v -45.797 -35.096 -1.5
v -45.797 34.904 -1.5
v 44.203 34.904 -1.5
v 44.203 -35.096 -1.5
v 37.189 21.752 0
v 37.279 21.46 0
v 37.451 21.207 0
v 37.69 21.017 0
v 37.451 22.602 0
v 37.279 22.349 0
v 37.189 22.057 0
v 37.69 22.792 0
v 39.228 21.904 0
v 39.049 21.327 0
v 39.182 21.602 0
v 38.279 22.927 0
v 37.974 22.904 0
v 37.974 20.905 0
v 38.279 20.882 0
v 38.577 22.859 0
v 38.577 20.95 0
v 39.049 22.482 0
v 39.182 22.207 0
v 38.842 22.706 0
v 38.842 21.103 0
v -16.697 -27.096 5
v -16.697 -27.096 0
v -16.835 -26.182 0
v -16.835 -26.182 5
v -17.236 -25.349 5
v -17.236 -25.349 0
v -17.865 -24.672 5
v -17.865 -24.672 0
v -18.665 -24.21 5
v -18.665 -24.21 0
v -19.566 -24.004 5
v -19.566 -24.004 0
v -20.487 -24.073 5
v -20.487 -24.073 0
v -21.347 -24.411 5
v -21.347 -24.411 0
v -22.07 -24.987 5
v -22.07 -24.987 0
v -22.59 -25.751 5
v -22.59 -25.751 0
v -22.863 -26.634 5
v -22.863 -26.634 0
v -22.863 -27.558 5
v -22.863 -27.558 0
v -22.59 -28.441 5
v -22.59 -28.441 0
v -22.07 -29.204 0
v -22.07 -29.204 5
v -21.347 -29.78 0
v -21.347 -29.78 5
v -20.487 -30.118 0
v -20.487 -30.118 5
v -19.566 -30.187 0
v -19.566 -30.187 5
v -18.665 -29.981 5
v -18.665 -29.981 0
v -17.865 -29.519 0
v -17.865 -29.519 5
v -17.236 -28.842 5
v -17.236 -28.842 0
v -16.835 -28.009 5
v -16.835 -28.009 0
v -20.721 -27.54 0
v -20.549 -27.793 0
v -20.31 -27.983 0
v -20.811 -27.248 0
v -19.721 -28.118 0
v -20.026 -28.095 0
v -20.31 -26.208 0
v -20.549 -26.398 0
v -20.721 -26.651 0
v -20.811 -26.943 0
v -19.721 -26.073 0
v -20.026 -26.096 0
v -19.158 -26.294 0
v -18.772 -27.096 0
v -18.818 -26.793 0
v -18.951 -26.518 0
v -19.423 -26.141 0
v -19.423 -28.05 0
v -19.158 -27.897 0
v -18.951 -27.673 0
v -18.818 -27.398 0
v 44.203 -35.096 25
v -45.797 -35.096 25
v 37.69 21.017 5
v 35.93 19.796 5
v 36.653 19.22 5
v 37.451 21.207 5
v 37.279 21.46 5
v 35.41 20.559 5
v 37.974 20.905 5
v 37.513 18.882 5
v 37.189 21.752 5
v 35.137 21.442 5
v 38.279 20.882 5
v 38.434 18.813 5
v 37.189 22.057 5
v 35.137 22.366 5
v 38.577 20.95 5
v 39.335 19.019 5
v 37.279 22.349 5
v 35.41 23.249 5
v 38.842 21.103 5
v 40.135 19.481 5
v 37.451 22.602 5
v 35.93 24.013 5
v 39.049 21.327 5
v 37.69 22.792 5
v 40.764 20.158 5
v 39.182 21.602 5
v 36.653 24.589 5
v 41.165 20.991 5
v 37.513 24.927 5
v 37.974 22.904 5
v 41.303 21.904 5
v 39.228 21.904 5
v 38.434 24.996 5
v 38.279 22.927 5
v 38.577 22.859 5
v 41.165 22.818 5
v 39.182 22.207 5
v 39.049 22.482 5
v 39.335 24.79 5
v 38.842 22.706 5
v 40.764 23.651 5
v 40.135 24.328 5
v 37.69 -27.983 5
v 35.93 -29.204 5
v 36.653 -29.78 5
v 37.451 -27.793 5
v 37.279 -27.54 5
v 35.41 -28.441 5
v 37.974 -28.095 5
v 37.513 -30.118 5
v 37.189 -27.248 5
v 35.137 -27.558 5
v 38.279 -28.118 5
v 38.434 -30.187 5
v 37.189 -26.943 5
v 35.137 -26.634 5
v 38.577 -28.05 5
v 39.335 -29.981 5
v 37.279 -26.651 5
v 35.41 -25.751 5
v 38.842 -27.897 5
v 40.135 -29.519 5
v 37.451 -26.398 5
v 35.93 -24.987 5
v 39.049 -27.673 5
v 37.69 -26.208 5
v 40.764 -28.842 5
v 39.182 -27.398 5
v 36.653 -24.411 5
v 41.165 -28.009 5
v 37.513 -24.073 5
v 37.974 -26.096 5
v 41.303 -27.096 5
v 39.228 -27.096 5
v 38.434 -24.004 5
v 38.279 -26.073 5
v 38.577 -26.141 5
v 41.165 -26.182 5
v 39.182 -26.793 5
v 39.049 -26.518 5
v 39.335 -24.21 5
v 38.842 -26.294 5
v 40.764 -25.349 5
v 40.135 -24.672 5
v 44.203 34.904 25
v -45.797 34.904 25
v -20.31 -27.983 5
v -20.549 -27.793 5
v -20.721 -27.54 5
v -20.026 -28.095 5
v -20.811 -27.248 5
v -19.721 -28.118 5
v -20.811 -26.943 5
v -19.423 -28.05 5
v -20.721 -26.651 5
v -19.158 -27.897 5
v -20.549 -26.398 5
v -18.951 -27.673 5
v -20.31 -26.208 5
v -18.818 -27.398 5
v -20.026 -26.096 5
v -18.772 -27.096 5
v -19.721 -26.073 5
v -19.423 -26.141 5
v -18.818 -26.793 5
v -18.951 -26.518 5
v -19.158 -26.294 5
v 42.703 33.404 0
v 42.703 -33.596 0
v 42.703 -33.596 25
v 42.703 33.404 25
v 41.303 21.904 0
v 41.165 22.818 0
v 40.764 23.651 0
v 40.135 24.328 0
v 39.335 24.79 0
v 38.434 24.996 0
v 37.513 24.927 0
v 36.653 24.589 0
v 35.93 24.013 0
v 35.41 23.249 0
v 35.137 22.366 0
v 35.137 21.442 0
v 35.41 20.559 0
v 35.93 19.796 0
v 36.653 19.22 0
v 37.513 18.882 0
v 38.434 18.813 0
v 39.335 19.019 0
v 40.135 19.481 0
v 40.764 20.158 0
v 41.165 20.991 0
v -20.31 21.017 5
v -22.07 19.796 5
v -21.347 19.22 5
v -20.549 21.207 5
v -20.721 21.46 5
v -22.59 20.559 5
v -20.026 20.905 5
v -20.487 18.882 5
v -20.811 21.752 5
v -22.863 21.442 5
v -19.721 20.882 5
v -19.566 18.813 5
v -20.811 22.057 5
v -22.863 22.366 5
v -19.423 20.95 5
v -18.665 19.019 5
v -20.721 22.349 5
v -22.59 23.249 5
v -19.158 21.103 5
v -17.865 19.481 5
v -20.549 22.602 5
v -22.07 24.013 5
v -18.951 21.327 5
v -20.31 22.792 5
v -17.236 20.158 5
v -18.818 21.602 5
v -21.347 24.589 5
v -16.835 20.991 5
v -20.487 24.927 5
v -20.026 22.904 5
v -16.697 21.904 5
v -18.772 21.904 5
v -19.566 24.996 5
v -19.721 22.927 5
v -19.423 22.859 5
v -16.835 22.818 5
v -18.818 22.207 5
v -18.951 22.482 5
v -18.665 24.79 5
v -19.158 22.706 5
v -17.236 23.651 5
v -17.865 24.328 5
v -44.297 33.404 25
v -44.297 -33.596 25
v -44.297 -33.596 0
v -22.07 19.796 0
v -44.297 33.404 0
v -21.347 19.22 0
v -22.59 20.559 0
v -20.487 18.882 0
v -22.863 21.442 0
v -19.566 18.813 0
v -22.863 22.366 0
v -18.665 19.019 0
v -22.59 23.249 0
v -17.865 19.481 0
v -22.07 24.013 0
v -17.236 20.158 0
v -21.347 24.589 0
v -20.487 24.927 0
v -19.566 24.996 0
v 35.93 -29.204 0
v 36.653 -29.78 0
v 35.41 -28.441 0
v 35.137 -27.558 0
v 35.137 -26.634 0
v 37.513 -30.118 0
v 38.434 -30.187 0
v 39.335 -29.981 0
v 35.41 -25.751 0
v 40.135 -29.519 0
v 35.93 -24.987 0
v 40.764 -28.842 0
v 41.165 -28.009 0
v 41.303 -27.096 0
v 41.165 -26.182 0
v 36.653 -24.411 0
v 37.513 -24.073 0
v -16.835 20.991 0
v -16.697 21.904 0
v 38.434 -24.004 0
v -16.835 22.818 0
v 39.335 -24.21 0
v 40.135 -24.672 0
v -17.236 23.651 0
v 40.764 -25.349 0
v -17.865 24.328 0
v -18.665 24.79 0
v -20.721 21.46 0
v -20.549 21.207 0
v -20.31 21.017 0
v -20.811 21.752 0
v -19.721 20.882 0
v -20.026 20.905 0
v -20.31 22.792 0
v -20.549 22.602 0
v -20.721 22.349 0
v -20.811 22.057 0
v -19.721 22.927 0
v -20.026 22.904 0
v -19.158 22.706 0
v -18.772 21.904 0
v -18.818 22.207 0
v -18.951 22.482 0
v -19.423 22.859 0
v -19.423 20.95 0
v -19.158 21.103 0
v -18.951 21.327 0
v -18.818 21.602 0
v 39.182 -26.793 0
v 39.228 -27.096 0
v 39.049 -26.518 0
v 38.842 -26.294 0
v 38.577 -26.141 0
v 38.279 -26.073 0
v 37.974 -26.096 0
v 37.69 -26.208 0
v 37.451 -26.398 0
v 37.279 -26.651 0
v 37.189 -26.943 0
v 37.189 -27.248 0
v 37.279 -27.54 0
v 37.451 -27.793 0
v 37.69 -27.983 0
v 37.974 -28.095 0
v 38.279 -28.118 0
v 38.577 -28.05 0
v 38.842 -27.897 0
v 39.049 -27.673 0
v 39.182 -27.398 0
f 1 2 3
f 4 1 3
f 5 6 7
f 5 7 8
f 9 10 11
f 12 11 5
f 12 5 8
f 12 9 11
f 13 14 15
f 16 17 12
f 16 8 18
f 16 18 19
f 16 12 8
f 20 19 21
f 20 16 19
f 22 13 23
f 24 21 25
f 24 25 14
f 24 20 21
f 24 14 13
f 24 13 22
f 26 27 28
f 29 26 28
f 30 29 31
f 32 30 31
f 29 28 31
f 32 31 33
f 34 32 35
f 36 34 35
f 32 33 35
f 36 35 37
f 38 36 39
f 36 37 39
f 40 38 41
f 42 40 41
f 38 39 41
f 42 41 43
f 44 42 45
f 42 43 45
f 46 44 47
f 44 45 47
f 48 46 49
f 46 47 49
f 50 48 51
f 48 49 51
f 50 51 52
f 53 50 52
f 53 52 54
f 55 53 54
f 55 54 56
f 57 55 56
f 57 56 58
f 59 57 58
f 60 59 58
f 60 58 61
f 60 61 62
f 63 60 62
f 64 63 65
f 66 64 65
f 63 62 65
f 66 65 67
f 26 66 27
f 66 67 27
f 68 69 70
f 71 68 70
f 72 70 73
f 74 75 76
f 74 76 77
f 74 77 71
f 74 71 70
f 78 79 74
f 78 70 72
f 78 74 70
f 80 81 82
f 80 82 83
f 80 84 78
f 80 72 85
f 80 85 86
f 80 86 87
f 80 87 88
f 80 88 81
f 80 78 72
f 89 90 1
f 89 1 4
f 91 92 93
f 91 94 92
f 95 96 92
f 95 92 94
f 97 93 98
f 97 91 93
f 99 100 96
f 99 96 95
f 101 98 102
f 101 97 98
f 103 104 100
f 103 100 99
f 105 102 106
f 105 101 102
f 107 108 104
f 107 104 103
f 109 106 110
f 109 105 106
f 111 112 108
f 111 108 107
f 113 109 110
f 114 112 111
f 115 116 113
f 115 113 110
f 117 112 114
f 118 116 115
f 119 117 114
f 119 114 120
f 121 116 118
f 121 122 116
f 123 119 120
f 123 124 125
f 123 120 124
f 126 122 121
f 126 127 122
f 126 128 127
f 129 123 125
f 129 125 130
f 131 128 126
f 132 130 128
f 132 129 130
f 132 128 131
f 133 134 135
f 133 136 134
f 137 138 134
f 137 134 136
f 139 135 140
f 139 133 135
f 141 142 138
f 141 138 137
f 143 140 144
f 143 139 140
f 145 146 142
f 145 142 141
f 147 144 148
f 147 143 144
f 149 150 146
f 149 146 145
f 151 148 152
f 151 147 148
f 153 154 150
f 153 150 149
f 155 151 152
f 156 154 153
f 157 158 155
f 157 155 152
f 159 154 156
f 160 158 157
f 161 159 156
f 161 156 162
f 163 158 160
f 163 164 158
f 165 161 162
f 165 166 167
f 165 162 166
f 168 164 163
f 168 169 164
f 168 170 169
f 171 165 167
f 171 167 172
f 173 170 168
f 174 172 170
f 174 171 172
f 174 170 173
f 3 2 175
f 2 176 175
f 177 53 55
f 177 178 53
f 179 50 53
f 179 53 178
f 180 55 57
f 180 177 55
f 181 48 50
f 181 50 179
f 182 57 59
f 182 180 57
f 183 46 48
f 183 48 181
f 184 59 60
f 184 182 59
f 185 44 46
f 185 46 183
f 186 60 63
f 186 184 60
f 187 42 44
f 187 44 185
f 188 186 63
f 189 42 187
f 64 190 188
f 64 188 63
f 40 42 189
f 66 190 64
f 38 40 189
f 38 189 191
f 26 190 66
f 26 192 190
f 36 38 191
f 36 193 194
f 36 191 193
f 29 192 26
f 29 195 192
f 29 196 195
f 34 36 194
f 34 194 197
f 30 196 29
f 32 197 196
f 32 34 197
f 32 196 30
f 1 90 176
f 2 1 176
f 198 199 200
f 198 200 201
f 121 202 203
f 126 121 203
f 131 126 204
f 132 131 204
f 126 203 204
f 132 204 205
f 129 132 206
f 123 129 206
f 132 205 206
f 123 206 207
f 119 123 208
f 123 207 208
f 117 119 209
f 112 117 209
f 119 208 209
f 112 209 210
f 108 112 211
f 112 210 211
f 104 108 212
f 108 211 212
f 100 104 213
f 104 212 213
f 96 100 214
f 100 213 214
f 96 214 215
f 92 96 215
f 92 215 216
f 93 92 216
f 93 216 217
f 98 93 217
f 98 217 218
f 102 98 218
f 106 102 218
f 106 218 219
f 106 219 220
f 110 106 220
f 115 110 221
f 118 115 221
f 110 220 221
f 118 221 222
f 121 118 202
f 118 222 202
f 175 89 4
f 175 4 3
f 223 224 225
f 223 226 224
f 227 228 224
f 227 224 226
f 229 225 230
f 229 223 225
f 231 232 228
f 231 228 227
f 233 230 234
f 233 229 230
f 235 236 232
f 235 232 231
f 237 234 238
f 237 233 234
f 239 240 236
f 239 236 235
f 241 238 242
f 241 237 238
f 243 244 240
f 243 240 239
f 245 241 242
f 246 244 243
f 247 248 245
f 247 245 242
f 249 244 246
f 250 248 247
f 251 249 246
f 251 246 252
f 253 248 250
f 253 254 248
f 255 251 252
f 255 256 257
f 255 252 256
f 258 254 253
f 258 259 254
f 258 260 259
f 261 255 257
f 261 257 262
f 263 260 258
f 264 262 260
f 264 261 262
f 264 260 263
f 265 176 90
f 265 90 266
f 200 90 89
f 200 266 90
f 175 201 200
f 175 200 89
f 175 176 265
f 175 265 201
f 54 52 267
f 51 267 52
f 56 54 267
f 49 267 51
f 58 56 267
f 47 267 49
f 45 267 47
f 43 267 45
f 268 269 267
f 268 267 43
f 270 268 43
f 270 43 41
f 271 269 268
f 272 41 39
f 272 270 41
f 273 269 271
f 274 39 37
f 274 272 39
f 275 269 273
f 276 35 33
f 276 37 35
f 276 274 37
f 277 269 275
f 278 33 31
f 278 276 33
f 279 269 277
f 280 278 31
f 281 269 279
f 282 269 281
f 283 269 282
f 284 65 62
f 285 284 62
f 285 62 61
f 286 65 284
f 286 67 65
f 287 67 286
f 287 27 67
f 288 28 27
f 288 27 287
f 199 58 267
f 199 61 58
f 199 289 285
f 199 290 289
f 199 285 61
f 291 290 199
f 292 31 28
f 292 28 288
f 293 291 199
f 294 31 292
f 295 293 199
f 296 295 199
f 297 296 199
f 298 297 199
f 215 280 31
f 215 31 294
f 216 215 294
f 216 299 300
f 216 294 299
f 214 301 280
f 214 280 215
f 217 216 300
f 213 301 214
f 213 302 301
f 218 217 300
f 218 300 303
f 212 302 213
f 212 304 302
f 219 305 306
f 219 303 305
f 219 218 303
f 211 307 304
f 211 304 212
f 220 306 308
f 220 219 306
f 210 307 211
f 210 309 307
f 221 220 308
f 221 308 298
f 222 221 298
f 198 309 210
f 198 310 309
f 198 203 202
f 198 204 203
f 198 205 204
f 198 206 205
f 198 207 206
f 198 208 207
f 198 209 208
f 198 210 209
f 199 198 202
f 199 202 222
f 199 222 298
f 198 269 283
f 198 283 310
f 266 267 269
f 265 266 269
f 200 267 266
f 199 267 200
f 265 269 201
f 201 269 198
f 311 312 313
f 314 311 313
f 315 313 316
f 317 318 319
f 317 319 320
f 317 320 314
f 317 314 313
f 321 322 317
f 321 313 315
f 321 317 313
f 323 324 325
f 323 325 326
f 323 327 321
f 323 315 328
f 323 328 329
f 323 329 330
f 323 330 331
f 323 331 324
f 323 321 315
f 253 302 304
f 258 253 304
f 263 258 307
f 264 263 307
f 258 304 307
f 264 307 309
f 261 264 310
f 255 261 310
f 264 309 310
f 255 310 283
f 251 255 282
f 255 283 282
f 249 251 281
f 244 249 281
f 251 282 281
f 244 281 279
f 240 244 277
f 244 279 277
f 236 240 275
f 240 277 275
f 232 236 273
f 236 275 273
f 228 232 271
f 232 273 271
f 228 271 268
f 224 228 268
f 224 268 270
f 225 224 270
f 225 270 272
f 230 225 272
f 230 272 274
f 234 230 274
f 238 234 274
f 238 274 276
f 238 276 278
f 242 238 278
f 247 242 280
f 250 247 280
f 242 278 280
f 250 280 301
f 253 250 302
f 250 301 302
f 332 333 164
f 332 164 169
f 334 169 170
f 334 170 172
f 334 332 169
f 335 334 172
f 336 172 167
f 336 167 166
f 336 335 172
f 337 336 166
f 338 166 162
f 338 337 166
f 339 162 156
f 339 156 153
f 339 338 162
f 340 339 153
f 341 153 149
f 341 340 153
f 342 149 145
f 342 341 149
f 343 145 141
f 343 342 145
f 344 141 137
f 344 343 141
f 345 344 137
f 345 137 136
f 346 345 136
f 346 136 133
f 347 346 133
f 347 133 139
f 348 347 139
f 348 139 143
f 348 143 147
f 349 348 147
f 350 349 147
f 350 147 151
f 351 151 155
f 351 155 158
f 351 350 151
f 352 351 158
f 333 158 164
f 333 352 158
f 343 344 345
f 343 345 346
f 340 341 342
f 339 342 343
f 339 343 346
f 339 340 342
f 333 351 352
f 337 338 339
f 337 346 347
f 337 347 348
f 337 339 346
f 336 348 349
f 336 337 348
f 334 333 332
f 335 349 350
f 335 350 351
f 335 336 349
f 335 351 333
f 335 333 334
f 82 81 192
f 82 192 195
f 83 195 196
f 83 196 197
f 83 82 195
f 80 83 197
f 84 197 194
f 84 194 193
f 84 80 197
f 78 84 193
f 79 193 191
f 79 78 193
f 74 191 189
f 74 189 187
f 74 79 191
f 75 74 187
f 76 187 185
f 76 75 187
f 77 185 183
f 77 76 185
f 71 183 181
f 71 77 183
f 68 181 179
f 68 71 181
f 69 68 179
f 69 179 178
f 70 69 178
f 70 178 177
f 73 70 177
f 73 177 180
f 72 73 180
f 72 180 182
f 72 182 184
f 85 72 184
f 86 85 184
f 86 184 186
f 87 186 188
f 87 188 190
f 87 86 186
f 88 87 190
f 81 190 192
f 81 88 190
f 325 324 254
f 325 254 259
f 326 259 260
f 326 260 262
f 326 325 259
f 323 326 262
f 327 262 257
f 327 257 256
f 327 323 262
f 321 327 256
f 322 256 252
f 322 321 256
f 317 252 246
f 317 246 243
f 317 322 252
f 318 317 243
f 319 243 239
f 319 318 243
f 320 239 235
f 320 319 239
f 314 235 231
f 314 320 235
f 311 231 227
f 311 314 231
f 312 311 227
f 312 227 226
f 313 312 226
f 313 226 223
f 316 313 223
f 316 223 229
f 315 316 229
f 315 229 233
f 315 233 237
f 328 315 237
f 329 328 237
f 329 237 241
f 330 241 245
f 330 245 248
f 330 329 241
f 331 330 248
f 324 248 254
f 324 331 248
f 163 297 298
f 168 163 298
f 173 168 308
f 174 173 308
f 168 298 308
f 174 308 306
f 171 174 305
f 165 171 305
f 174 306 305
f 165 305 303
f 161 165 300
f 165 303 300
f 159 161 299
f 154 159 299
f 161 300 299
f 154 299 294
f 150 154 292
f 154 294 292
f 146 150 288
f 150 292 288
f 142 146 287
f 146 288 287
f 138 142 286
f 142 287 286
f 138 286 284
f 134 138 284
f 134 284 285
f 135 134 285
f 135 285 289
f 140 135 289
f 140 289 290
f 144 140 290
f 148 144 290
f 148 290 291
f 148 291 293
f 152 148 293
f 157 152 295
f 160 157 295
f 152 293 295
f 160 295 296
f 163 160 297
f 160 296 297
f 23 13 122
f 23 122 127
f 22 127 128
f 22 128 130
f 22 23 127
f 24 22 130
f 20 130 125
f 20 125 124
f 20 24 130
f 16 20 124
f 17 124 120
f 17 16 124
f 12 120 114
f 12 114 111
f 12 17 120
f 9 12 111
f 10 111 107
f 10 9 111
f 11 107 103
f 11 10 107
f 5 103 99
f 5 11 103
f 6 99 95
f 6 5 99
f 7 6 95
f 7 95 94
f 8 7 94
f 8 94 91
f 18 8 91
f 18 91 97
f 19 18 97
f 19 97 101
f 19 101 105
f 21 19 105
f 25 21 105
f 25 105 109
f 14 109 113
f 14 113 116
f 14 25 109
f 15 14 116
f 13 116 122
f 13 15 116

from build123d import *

# Parameters (mm, degrees)
F0_W     = 90
F0_H     = 70
F0_W_2   = 87
F0_H_2   = 67
F1_DEPTH = 25
F0_R     = 3.1
F0_R_2   = 1.025
F2_DEPTH = 1.5
F3_DEPTH = 5


with BuildPart() as f1:
    # F0 (on Top) → F1 (new body)
    with BuildSketch(Plane.XY):
        with Locations((-0.797456, -0.095572)):
            Rectangle(F0_W, F0_H)
        with Locations((-0.797456, -0.095572)):
            Rectangle(F0_W_2, F0_H_2, mode=Mode.SUBTRACT)
    extrude(amount=F1_DEPTH)

    # F0 (on Top) → F2 (join)
    with BuildSketch(Plane.XY):
        with Locations((-0.797456, -0.095572)):
            Rectangle(F0_W, F0_H)
        with Locations((-0.797456, -0.095572)):
            Rectangle(F0_W_2, F0_H_2, mode=Mode.SUBTRACT)
        with Locations((-0.797456, -0.095572)):
            Rectangle(F0_W_2, F0_H_2)
        with Locations((-19.797456, -27.095572)):
            Circle(F0_R, mode=Mode.SUBTRACT)
        with Locations((38.202544, -27.095572)):
            Circle(F0_R, mode=Mode.SUBTRACT)
        with Locations((-19.797456, 21.904428)):
            Circle(F0_R, mode=Mode.SUBTRACT)
        with Locations((38.202544, 21.904428)):
            Circle(F0_R, mode=Mode.SUBTRACT)
        with Locations((38.202544, -27.095572)):
            Circle(F0_R)
        with Locations((38.202544, -27.095572)):
            Circle(F0_R_2, mode=Mode.SUBTRACT)
        with Locations((38.202544, -27.095572)):
            Circle(F0_R_2)
        with Locations((38.202544, 21.904428)):
            Circle(F0_R)
        with Locations((38.202544, 21.904428)):
            Circle(F0_R_2, mode=Mode.SUBTRACT)
        with Locations((38.202544, 21.904428)):
            Circle(F0_R_2)
        with Locations((-19.797456, 21.904428)):
            Circle(F0_R)
        with Locations((-19.797456, 21.904428)):
            Circle(F0_R_2, mode=Mode.SUBTRACT)
        with Locations((-19.797456, 21.904428)):
            Circle(F0_R_2)
        with Locations((-19.797456, -27.095572)):
            Circle(F0_R)
        with Locations((-19.797456, -27.095572)):
            Circle(F0_R_2, mode=Mode.SUBTRACT)
        with Locations((-19.797456, -27.095572)):
            Circle(F0_R_2)
    extrude(amount=-F2_DEPTH)

    # F0 (on Top) → F3 (join)
    with BuildSketch(Plane.XY):
        with Locations((-19.797456, 21.904428)):
            Circle(F0_R)
        with Locations((-19.797456, 21.904428)):
            Circle(F0_R_2, mode=Mode.SUBTRACT)
        with Locations((38.202544, 21.904428)):
            Circle(F0_R)
        with Locations((38.202544, 21.904428)):
            Circle(F0_R_2, mode=Mode.SUBTRACT)
        with Locations((38.202544, -27.095572)):
            Circle(F0_R)
        with Locations((38.202544, -27.095572)):
            Circle(F0_R_2, mode=Mode.SUBTRACT)
        with Locations((-19.797456, -27.095572)):
            Circle(F0_R)
        with Locations((-19.797456, -27.095572)):
            Circle(F0_R_2, mode=Mode.SUBTRACT)
    extrude(amount=F3_DEPTH)


solid = f1.part
